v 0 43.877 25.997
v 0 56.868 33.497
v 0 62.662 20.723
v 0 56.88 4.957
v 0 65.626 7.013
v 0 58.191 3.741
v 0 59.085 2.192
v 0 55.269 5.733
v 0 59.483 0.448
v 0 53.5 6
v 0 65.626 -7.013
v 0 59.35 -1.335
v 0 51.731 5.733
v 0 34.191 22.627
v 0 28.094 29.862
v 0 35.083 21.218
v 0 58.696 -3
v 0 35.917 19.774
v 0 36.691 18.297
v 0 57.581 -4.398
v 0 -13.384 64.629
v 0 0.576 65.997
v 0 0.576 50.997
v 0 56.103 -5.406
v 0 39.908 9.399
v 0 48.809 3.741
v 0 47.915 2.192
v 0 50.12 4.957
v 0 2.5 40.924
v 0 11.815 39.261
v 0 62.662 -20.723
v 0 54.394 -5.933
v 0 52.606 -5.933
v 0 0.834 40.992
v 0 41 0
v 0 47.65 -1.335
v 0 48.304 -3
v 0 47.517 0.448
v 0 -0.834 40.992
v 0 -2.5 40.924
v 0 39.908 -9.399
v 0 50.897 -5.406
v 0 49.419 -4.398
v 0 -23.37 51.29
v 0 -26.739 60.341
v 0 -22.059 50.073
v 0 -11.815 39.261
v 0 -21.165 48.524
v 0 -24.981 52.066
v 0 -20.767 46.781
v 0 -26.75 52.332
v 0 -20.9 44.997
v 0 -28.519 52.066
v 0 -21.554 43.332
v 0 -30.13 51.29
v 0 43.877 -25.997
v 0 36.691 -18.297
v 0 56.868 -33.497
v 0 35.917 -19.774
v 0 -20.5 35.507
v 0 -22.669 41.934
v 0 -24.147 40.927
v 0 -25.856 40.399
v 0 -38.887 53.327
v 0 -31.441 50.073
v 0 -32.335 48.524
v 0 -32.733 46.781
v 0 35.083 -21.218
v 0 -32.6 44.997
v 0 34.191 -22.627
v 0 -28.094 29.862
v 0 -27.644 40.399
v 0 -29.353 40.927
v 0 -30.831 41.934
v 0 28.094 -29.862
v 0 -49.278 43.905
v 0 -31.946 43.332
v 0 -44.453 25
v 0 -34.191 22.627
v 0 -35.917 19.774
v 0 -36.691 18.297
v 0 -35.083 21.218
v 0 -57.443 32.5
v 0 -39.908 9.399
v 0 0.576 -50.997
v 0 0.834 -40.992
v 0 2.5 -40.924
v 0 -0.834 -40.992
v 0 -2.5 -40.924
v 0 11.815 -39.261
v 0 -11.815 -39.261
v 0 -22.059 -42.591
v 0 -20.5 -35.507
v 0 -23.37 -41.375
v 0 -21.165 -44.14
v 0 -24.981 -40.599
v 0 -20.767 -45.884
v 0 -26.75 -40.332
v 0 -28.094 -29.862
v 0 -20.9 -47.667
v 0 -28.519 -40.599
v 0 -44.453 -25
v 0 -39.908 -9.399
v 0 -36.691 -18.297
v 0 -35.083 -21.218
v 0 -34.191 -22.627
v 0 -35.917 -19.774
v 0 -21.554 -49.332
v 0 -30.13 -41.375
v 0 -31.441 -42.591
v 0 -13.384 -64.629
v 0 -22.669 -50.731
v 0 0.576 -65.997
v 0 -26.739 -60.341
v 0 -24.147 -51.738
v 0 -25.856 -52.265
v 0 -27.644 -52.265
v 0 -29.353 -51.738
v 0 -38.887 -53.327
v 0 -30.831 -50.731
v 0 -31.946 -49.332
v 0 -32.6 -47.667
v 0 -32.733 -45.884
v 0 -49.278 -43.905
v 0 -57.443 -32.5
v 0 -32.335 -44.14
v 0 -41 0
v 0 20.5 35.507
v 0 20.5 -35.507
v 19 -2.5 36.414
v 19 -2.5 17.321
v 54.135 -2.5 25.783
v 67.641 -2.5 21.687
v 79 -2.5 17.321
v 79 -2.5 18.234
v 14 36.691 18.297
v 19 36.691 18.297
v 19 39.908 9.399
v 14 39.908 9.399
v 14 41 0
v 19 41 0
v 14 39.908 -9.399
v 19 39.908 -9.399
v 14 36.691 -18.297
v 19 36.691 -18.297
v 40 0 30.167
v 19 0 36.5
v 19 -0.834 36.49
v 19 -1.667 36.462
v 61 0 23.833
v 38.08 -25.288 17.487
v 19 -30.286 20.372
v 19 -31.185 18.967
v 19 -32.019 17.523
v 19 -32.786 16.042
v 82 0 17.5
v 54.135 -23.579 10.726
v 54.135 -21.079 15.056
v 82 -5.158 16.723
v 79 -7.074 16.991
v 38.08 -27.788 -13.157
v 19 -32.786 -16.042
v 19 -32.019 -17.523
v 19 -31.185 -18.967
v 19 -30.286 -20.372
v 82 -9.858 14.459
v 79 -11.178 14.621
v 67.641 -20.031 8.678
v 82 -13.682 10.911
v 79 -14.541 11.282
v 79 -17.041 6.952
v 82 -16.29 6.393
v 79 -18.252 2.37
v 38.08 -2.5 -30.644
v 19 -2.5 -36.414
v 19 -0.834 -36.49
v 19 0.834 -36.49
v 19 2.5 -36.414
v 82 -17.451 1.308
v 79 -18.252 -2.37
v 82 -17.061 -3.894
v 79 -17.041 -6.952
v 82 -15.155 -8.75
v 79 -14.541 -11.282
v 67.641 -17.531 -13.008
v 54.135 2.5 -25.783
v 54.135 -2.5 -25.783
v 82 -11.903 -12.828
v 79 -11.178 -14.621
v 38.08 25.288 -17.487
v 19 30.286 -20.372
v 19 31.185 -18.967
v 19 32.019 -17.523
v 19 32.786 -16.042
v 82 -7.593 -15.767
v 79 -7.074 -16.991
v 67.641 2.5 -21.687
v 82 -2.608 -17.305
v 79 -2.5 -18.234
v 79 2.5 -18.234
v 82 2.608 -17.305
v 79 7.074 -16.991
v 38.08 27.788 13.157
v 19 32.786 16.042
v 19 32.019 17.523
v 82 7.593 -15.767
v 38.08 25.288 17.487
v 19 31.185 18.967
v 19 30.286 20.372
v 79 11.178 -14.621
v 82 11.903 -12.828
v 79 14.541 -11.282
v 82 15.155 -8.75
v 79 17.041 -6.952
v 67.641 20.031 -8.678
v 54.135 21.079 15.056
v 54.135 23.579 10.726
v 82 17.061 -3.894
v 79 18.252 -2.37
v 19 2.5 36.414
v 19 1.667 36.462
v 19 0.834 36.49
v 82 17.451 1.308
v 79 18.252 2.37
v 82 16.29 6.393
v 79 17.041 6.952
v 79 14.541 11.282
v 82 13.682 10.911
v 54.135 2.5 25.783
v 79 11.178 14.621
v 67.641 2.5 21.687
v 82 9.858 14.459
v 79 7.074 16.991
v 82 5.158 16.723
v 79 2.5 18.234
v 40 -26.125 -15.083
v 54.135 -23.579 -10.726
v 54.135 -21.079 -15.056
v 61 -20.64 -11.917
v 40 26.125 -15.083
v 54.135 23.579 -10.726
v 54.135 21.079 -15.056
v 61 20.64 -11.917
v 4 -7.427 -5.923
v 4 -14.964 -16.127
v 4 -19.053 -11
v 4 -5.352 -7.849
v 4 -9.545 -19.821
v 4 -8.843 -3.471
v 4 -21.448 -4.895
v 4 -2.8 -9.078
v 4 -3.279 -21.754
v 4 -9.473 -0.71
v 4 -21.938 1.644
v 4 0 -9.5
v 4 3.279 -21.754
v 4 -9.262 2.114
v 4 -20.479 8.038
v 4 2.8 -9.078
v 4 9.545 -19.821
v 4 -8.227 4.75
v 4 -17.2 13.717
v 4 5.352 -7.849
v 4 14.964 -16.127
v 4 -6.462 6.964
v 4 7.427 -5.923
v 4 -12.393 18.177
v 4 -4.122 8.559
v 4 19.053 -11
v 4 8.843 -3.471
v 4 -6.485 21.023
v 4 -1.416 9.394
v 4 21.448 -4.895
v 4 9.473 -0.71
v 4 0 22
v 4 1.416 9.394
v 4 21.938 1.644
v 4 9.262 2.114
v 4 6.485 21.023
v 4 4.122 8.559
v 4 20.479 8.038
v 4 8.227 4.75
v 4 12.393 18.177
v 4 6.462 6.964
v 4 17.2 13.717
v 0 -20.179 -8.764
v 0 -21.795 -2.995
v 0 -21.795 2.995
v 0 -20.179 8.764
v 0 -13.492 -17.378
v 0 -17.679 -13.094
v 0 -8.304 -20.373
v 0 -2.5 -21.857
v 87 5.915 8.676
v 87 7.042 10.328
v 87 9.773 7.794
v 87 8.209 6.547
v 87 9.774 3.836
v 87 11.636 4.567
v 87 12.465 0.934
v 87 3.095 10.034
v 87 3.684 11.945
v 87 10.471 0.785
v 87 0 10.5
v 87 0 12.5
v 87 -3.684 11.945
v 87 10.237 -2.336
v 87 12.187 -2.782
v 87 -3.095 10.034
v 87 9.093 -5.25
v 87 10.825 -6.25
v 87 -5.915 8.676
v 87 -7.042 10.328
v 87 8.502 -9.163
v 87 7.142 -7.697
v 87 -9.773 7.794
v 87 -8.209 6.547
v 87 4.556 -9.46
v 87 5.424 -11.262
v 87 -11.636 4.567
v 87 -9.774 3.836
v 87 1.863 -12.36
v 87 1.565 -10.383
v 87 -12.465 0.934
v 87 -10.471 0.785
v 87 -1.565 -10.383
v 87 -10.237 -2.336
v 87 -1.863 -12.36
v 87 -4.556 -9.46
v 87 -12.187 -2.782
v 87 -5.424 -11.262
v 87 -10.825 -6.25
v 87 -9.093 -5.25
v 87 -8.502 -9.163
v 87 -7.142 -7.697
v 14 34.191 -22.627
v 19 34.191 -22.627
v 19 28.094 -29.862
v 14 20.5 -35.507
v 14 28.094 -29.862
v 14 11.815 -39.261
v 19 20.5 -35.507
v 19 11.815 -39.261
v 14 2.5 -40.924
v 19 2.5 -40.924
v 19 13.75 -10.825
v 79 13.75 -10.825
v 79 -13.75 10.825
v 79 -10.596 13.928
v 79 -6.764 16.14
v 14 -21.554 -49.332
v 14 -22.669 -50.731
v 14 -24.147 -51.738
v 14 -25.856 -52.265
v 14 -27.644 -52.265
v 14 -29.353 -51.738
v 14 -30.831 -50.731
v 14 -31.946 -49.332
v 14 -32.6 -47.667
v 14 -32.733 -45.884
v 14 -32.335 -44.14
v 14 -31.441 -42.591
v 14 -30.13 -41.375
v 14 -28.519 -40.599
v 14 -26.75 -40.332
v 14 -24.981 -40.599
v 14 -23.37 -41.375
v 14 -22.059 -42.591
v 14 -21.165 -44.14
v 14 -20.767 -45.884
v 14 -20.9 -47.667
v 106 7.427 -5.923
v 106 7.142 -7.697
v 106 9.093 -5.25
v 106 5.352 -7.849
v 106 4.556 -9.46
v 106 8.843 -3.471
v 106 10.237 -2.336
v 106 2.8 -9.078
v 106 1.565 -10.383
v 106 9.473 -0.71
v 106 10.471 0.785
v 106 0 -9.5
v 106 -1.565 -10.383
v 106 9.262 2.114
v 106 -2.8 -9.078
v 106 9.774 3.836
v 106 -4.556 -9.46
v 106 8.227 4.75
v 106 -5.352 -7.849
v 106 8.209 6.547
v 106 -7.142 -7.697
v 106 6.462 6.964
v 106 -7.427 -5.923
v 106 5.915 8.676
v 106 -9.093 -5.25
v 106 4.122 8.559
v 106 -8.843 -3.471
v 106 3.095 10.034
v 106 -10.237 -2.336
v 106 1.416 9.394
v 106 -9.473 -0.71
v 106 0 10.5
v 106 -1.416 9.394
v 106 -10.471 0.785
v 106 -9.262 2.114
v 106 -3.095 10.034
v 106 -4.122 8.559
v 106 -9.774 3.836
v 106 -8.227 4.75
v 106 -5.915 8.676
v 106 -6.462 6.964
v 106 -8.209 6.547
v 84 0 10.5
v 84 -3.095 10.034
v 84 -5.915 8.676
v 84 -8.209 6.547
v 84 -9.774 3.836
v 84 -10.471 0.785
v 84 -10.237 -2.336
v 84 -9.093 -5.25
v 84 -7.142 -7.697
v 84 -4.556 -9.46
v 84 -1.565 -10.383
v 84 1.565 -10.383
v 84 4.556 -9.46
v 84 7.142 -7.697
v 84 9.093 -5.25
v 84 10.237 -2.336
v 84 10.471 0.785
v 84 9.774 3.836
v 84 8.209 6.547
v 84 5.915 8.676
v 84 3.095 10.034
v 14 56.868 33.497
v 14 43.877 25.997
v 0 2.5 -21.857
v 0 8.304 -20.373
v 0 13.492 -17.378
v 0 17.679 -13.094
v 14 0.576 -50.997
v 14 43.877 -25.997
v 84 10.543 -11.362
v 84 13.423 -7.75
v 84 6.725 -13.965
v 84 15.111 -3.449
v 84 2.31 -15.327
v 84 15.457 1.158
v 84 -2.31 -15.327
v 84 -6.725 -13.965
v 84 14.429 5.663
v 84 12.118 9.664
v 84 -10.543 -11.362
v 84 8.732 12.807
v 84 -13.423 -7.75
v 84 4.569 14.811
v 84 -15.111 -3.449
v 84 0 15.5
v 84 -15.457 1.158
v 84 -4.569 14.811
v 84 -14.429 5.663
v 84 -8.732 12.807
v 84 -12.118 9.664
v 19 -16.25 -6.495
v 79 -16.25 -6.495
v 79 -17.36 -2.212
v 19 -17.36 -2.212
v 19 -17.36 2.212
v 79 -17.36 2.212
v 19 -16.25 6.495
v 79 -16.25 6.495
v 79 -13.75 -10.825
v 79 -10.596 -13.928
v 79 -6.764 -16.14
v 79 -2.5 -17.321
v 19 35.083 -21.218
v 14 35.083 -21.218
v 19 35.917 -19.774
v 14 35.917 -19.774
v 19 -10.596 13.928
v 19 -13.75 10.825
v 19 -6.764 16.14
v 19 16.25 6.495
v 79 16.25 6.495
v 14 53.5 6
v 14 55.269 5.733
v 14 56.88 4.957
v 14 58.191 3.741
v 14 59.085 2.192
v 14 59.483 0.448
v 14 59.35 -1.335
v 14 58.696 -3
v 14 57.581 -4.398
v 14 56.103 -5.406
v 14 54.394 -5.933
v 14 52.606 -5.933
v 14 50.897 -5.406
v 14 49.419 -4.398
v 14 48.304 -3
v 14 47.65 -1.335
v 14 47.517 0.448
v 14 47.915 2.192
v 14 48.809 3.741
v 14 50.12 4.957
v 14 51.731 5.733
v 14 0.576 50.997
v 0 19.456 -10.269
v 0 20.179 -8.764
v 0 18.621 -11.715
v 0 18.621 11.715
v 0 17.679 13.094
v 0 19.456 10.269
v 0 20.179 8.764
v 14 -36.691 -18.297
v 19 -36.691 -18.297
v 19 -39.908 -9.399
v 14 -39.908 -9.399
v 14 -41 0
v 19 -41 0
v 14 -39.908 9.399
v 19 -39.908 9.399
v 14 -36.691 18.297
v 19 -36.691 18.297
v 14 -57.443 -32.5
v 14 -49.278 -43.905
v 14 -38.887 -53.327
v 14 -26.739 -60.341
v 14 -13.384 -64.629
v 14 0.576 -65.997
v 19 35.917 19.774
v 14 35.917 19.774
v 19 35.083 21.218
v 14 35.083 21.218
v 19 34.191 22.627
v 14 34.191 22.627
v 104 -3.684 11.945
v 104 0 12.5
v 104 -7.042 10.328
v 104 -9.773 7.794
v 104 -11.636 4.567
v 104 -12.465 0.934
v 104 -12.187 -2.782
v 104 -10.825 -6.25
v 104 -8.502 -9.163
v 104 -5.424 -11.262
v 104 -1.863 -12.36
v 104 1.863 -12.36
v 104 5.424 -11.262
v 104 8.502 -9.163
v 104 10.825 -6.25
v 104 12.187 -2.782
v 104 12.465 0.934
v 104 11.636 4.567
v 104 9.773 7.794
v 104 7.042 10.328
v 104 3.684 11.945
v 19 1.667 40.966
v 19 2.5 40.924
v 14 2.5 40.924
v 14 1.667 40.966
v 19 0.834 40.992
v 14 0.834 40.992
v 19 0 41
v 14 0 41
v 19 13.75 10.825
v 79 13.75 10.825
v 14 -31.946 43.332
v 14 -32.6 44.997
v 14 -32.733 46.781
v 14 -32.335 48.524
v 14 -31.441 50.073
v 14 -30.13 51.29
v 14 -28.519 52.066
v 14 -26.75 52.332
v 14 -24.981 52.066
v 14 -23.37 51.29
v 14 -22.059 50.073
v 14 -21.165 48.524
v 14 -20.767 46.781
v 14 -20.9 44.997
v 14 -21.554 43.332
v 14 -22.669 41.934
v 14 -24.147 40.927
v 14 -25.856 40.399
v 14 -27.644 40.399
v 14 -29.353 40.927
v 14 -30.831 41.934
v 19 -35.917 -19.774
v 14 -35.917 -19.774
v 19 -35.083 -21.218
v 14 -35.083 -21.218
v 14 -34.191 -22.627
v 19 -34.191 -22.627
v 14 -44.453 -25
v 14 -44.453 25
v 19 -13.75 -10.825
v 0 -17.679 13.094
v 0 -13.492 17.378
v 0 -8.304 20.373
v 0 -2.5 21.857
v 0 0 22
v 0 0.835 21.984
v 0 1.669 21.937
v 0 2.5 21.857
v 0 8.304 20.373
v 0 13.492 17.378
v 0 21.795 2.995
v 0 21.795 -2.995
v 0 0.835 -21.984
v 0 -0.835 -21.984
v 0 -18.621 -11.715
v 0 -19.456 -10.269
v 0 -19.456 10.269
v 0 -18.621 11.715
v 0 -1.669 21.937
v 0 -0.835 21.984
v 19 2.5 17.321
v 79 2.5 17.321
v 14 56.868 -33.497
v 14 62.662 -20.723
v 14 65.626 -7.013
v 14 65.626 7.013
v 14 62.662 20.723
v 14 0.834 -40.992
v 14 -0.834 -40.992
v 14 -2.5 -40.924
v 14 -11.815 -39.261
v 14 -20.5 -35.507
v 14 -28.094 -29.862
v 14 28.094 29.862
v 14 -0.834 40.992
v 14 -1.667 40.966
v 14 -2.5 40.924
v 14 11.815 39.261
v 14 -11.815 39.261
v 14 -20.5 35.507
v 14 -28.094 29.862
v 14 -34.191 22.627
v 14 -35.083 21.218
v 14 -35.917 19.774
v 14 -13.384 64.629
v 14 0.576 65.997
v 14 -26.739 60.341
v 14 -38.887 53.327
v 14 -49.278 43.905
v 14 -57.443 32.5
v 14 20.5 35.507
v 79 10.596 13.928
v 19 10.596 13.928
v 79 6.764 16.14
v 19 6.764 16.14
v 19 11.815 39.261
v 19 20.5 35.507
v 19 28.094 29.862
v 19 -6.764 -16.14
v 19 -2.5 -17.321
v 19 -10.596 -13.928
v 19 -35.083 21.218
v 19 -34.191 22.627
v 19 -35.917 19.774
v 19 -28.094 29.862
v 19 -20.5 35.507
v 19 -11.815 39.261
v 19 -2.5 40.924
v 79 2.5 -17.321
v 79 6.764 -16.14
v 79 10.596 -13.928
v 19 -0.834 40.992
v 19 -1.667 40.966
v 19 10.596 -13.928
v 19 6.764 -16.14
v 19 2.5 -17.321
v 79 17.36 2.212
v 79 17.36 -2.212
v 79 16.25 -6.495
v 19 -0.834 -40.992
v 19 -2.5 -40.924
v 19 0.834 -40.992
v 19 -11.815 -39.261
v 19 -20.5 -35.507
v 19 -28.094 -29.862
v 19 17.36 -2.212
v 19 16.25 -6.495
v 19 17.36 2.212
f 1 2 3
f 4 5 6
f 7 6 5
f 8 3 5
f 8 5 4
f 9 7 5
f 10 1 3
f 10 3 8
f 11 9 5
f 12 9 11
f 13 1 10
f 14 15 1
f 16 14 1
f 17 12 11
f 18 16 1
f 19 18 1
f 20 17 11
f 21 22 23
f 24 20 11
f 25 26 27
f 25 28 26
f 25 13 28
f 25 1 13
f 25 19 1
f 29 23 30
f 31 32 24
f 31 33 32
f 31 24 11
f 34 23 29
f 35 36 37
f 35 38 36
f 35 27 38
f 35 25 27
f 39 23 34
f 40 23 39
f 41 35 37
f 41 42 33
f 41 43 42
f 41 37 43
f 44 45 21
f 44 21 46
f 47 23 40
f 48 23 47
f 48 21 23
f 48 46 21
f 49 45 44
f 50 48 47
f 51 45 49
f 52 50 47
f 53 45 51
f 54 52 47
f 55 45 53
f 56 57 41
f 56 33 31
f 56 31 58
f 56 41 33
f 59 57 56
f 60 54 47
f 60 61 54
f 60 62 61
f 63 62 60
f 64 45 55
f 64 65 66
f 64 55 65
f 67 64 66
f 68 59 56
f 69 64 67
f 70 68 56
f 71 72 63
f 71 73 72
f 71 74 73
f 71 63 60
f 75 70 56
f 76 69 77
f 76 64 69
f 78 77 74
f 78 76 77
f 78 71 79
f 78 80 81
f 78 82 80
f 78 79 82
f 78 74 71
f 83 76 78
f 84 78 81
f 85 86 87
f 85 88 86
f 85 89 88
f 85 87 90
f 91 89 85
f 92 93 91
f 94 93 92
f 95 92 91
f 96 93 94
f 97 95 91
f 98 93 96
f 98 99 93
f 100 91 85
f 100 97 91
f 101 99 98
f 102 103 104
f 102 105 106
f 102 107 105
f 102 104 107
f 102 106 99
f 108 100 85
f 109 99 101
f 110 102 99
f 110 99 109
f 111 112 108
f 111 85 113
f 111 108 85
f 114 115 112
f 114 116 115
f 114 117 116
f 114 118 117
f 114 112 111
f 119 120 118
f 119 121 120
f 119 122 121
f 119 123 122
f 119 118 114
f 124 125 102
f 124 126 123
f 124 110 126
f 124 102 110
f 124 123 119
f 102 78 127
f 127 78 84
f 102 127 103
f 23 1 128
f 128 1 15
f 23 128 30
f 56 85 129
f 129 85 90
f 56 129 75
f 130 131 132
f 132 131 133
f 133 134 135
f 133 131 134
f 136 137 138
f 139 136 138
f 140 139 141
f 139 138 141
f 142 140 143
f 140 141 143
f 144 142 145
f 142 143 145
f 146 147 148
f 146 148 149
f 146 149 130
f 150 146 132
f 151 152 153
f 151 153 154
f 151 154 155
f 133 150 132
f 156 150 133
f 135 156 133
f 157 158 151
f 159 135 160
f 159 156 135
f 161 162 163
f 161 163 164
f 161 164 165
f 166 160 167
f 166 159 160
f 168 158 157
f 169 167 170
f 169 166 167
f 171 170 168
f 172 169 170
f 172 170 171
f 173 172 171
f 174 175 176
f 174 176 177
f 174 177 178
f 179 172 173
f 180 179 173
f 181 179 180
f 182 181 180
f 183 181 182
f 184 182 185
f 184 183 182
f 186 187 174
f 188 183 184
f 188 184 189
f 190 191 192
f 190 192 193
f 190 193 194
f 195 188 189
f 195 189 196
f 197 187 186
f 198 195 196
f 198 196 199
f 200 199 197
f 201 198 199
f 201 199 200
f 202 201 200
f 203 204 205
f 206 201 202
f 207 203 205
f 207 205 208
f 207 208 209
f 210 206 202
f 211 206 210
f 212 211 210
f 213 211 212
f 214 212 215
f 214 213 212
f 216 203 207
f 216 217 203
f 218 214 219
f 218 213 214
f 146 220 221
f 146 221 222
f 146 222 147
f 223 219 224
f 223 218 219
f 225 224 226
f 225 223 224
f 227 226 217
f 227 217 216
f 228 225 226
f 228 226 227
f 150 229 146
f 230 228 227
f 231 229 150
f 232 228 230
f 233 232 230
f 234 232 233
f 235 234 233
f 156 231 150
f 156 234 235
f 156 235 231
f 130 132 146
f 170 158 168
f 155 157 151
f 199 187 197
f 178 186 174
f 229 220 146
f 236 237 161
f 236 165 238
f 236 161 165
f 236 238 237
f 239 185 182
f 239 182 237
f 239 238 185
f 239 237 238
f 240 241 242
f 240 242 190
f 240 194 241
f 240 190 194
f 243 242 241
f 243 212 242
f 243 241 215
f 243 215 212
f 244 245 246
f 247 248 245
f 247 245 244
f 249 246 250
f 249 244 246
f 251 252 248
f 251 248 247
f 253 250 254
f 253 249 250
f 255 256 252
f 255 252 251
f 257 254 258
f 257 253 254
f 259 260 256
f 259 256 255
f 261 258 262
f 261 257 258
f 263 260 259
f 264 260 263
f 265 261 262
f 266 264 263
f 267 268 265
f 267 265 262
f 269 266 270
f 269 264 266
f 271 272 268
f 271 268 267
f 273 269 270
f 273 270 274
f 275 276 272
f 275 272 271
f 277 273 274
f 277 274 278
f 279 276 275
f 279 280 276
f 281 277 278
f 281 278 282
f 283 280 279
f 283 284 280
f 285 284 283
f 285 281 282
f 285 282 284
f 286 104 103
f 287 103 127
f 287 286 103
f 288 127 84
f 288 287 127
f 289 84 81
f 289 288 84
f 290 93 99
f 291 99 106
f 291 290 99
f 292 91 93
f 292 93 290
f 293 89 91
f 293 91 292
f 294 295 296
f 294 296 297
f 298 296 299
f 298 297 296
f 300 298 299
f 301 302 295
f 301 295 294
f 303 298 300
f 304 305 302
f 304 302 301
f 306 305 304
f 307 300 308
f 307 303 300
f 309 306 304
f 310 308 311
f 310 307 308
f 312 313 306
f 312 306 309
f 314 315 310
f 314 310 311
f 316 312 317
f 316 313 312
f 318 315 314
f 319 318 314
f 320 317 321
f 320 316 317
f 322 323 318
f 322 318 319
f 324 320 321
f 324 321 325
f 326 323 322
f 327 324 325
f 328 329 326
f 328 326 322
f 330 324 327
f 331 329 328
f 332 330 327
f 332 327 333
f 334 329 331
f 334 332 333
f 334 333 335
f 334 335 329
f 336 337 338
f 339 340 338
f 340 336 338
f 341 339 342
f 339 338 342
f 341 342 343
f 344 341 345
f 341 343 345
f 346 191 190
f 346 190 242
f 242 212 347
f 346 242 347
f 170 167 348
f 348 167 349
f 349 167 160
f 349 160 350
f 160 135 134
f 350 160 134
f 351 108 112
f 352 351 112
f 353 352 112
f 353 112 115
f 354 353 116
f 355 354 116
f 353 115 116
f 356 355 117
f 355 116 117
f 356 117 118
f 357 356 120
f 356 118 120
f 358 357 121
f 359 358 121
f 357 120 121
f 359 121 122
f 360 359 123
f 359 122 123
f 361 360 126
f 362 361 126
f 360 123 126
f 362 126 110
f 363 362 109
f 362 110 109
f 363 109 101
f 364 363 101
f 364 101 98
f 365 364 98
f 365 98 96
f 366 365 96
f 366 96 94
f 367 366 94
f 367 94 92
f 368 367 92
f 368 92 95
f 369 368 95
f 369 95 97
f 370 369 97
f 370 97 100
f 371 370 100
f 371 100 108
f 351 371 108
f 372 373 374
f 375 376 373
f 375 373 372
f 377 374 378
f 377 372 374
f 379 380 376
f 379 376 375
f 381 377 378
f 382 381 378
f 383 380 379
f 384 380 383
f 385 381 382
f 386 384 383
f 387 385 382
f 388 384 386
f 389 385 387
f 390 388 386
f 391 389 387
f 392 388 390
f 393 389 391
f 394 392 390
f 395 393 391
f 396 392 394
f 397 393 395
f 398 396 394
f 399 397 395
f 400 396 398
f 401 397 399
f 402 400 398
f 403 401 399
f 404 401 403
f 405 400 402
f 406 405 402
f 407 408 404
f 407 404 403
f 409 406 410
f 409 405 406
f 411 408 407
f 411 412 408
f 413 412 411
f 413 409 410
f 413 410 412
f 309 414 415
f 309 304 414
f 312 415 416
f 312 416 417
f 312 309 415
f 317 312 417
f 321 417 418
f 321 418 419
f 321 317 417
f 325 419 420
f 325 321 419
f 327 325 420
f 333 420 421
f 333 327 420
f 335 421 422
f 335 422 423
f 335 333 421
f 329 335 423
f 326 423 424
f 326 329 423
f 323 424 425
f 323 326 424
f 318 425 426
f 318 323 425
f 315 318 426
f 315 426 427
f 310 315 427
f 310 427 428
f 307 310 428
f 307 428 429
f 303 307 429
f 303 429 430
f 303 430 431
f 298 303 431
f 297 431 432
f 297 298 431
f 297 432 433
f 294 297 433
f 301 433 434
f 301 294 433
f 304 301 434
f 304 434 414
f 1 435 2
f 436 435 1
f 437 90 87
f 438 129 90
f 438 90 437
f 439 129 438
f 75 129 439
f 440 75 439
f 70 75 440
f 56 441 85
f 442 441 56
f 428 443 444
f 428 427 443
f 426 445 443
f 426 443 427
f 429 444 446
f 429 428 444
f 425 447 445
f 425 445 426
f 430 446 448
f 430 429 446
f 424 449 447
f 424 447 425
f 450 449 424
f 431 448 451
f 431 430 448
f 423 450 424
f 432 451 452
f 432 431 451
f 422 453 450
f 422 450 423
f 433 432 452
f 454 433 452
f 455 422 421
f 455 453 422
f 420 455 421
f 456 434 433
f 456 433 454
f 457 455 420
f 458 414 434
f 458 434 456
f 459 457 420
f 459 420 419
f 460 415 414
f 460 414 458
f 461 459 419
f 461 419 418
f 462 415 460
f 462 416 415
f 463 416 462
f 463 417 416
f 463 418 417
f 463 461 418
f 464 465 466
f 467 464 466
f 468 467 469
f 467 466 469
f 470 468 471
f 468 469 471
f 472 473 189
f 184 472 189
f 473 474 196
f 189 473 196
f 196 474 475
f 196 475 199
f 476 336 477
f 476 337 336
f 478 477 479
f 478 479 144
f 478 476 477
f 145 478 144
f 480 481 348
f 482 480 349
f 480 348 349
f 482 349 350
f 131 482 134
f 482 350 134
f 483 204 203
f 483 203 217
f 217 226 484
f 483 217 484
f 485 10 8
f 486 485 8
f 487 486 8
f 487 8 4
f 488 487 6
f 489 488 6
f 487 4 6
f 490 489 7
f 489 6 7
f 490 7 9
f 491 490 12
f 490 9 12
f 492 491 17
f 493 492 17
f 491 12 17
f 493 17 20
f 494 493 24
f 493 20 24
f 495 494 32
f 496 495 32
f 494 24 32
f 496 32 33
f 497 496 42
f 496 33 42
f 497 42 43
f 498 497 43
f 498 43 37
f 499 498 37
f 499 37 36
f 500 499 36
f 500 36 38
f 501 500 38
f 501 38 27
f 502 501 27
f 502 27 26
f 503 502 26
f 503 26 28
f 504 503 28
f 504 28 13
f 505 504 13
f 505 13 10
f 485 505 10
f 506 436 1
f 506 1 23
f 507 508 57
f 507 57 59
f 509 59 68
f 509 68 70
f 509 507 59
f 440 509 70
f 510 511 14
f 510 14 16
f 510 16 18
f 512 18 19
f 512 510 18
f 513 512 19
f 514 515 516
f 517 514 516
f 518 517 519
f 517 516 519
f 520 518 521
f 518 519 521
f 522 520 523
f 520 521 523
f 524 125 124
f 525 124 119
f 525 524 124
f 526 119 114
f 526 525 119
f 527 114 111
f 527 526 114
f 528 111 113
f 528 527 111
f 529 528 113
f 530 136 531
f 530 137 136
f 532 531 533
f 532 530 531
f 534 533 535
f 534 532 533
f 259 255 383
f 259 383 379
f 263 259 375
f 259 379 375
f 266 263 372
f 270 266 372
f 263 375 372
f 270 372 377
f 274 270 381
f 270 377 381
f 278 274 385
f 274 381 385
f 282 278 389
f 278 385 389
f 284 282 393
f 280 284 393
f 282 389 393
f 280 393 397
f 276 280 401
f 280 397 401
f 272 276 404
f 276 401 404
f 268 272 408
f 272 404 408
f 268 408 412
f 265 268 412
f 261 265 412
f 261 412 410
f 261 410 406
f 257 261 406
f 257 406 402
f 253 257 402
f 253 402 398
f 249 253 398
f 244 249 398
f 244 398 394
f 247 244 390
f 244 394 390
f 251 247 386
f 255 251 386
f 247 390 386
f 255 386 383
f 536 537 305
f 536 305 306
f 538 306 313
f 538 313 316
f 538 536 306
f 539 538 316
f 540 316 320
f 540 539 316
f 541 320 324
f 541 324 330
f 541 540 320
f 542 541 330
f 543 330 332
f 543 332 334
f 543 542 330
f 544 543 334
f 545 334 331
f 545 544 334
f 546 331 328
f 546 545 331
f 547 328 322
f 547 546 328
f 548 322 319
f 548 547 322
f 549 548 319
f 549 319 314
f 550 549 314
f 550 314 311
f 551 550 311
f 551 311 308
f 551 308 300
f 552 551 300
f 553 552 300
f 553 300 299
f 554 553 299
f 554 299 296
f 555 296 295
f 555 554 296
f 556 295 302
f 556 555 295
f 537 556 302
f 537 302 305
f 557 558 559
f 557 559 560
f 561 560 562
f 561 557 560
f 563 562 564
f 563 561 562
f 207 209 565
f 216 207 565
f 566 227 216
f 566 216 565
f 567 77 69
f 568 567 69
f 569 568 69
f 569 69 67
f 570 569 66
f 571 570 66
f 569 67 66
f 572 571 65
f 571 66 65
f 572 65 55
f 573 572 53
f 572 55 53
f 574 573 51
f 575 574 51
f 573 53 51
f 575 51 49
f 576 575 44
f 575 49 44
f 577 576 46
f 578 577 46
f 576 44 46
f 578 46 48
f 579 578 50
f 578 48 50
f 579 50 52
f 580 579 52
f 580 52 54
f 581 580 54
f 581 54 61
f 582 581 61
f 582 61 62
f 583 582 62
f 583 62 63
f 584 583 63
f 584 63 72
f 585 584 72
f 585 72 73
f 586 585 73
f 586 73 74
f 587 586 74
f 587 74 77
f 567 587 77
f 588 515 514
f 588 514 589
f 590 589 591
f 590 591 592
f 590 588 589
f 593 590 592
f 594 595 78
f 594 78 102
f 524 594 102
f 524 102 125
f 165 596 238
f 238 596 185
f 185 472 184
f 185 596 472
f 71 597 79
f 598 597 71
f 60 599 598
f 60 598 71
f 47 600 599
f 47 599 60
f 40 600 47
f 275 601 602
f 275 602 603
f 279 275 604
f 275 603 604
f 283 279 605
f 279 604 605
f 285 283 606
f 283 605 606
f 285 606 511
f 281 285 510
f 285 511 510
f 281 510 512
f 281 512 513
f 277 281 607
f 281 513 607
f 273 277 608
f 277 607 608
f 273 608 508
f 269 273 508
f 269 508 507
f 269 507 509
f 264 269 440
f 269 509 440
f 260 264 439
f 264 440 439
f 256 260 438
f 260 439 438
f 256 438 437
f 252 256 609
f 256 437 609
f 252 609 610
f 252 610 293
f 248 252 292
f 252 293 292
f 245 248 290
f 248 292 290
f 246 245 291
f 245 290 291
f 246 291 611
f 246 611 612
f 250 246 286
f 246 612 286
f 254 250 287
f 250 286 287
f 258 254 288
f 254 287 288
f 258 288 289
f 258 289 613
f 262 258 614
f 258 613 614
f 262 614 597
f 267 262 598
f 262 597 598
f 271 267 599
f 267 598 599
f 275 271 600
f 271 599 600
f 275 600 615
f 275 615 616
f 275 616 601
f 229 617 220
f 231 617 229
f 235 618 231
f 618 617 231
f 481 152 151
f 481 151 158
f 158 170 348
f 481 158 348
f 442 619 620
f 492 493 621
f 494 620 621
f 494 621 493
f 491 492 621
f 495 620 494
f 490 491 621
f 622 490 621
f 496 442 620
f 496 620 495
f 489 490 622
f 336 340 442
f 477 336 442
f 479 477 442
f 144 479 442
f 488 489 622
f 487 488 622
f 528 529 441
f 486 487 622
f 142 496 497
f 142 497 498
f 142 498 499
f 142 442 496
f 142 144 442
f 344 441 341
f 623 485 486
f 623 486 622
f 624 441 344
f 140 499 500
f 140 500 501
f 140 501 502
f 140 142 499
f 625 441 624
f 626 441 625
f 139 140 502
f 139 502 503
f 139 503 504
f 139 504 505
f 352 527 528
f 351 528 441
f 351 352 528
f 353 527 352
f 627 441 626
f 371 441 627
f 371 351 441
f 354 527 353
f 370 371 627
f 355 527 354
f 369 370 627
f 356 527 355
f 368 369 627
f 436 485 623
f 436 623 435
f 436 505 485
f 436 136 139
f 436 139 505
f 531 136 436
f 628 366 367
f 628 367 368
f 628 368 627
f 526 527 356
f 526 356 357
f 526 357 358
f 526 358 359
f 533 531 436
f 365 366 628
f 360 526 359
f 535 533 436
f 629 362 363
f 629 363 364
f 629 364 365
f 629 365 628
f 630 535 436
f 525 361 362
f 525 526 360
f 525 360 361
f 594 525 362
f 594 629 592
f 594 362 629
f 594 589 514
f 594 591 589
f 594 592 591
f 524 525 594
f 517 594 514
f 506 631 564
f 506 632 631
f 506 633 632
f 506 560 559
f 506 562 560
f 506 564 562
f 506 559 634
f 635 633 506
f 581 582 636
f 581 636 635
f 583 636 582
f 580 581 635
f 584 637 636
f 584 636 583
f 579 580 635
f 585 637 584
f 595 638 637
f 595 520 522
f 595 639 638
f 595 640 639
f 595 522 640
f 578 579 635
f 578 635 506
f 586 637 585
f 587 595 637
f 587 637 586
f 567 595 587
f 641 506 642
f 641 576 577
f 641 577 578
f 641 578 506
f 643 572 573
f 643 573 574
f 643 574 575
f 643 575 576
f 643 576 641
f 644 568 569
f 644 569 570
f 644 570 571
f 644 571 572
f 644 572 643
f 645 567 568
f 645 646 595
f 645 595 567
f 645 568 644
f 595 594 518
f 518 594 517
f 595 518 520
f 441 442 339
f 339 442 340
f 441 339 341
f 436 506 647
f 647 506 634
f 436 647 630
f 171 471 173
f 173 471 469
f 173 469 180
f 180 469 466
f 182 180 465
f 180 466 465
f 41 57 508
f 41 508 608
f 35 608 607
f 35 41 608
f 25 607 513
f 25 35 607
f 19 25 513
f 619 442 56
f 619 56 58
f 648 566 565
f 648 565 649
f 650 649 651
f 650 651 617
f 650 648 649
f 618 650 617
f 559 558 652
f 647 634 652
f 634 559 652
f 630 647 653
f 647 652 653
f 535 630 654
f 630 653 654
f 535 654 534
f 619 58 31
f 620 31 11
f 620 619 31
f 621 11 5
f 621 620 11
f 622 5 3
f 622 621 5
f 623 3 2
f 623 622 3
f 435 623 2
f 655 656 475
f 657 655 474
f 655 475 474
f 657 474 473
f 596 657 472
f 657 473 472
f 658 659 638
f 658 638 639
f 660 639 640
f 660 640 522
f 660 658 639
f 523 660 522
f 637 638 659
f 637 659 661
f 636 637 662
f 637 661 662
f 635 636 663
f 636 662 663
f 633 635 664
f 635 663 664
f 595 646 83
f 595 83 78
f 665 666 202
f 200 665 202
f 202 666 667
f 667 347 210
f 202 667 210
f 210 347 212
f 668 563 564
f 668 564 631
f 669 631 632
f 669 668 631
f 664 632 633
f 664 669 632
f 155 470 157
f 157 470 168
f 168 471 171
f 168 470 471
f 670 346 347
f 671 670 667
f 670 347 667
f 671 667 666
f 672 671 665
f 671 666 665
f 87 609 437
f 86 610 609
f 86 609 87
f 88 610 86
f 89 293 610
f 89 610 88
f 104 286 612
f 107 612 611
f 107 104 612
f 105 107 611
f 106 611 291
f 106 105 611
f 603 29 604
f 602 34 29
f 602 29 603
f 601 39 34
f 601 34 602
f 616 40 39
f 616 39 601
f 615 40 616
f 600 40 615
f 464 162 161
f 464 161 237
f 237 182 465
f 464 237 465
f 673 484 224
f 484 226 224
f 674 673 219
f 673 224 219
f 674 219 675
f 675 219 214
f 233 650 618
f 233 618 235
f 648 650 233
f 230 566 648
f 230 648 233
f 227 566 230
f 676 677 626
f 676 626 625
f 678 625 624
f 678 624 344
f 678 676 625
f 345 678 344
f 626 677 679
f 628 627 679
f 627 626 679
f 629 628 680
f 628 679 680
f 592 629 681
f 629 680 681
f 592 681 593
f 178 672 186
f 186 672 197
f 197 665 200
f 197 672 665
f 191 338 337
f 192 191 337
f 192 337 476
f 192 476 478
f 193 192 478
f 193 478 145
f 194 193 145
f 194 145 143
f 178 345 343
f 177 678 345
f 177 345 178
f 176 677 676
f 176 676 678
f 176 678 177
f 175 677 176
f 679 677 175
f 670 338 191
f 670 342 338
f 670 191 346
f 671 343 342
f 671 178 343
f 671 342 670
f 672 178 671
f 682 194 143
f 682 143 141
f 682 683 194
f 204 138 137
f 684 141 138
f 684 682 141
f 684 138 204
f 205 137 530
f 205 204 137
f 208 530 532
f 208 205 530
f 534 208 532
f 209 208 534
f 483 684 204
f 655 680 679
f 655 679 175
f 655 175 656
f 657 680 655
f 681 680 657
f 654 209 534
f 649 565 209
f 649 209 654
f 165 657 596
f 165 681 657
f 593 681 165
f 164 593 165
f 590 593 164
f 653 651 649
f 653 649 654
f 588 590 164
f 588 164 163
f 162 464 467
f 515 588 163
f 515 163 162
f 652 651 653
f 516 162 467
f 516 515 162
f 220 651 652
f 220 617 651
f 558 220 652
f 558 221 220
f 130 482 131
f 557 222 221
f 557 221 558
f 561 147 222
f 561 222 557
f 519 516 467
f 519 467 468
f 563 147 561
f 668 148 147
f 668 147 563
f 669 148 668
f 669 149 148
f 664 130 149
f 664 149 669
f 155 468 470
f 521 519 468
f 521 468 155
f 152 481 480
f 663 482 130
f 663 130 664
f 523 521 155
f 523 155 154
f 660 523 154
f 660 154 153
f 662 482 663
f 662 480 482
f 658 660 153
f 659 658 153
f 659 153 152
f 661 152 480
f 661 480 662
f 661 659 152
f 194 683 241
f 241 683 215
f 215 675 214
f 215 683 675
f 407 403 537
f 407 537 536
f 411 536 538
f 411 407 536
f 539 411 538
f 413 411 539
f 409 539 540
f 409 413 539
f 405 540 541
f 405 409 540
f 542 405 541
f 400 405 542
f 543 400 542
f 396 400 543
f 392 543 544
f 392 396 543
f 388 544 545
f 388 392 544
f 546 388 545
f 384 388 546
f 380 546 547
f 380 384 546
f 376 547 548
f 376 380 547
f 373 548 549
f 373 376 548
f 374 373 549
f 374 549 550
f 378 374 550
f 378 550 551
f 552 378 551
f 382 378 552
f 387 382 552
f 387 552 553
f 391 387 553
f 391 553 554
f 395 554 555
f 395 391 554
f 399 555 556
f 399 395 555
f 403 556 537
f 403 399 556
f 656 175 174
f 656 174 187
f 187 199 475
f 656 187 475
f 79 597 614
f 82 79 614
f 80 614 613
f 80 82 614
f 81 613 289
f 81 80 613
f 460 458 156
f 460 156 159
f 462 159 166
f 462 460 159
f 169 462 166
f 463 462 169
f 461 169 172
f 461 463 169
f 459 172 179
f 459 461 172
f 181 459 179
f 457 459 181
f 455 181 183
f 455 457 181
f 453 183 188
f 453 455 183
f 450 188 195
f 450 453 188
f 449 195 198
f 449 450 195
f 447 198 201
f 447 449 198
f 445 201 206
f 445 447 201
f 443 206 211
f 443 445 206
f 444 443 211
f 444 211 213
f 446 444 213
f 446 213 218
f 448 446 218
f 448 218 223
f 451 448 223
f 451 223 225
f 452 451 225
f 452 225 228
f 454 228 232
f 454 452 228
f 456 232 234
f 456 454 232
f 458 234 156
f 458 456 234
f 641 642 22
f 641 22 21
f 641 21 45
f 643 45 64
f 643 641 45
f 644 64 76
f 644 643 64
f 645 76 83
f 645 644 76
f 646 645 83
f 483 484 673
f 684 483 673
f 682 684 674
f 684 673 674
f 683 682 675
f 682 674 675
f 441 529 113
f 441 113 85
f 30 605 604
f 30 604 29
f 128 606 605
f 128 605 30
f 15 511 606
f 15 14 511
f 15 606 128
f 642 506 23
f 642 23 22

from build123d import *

# Parameters (mm, degrees)
SKETCH2_W           = 3
SKETCH2_H           = 2
CHAMFER1_SIZE       = 2
CUT_EXTRUDE1_DEPTH  = 132.057239403
CIRPATTERN1_COUNT   = 3
HOLE1_D             = 12
CIRPATTERN2_COUNT   = 3
CUT_EXTRUDE2_START  = -79
CUT_EXTRUDE2_DEPTH  = 79
BOSS_EXTRUDE2_START = -19
SKETCH9_R           = 41
BOSS_EXTRUDE2_DEPTH = 19
HOLE3_D             = 19
HOLE3_CBORE_D       = 44
HOLE3_CBORE_DEPTH   = 4


with BuildPart() as part:
    # Sketch1 → Revolve3 (revolve)
    with BuildSketch(Plane.XY, mode=Mode.PRIVATE) as revolve3_sk:
        Polygon((0, 0), (0, 66), (14, 66), (14, 41), (19, 41), (19, 17.5), (84, 17.5), (84, 12.5), (106, 12.5), (106, 0), align=None)
    revolve(revolve3_sk.sketch.rotate(Axis((0, 0, 0), (1, 0, 0)), 90), axis=Axis((0, 0, 0), (1, 0, 0)))

    # Sketch2 → Cut-Revolve1 (revolve, cut)
    with BuildSketch(Plane.XY, mode=Mode.PRIVATE) as cut_revolve1_sk:
        with Locations((85.5, 11.5)):
            Rectangle(SKETCH2_W, SKETCH2_H)
    revolve(cut_revolve1_sk.sketch.rotate(Axis((0, 0, 0), (1, 0, 0)), 90), axis=Axis((0, 0, 0), (1, 0, 0)), mode=Mode.SUBTRACT)

    # Sketch3 → Revolve5 (revolve)
    with BuildSketch(Plane(origin=(0, 0, 0), x_dir=(1, 0, 0), z_dir=(0, 1, 0)), mode=Mode.PRIVATE) as revolve5_sk:
        Polygon((19, 36.5), (82, 17.5), (19, 17.5), align=None)
    revolve(revolve5_sk.sketch.rotate(Axis((0, 0, 0), (1, 0, 0)), 180), axis=Axis((0, 0, 0), (1, 0, 0)))

    # Chamfer1
    chamfer1_edges = [part.edges().sort_by_distance(p)[0] for p in [
        (106, 0, -12.5),
        (84, 0, -17.5),
    ]]
    chamfer(chamfer1_edges, length=CHAMFER1_SIZE - 0.0001)  # a hair under: the kernel refuses the full size

    # Sketch4 → Cut-Extrude1 (cut, through all)
    with BuildSketch(Plane(origin=(14, 0, 0), x_dir=(0, 0, -1), z_dir=(1, 0, 0))):
        with BuildLine():
            Line((-32.5, -57.443450453), (-25, -44.453069397))
            Line((-25, -44.453069397), (25, -44.453069397))
            Line((25, -44.453069397), (32.5, -57.443450453))
            ThreePointArc((32.5, -57.443450453), (0, -66), (-32.5, -57.443450453))
        make_face()
    cut_extrude1 = extrude(amount=-CUT_EXTRUDE1_DEPTH, mode=Mode.SUBTRACT)

    # CirPattern1: Cut-Extrude1 ×3 about axis
    cirpattern1_axis = Axis((0, 0, 0), (1, 0, 0))
    for i in range(1, CIRPATTERN1_COUNT):
        add(cut_extrude1.rotate(cirpattern1_axis, i * 360 / CIRPATTERN1_COUNT), mode=Mode.SUBTRACT)

    # Hole1 (through all)
    with Locations(Plane(origin=(14, 0, 0), x_dir=(0, 0, -1), z_dir=(1, 0, 0))):
        with Locations((0, 53.5)):
            hole1 = Hole(HOLE1_D / 2)

    # CirPattern2: Hole1 ×3 about axis
    cirpattern2_axis = Axis((0, 0, 0), (1, 0, 0))
    for i in range(1, CIRPATTERN2_COUNT):
        add(hole1.rotate(cirpattern2_axis, i * 360 / CIRPATTERN2_COUNT), mode=Mode.SUBTRACT)

    # Sketch7 → Cut-Extrude2 (cut)
    with BuildSketch(Plane.ZY.offset(CUT_EXTRUDE2_START)):
        with BuildLine():
            Line((17.320508076, 2.5), (40.923709509, 2.5))
            ThreePointArc((40.923709509, 2.5), (35.507041555, 20.5), (22.626918264, 34.190972052))
            Line((22.626918264, 34.190972052), (10.825317547, 13.75))
            ThreePointArc((10.825317547, 13.75), (15.155444566, 8.75), (17.320508076, 2.5))
        make_face()
        with BuildLine():
            Line((17.320508076, -2.5), (40.923709509, -2.5))
            ThreePointArc((40.923709509, -2.5), (35.507041555, -20.5), (22.626918264, -34.190972052))
            Line((22.626918264, -34.190972052), (10.825317547, -13.75))
            ThreePointArc((10.825317547, -13.75), (15.155444566, -8.75), (17.320508076, -2.5))
        make_face()
        with BuildLine():
            Line((6.495190528, -16.25), (18.296791245, -36.690972052))
            ThreePointArc((18.296791245, -36.690972052), (0, -41), (-18.296791245, -36.690972052))
            Line((-18.296791245, -36.690972052), (-6.495190528, -16.25))
            ThreePointArc((-6.495190528, -16.25), (0, -17.5), (6.495190528, -16.25))
        make_face()
        with BuildLine():
            Line((-10.825317547, -13.75), (-22.626918264, -34.190972052))
            ThreePointArc((-22.626918264, -34.190972052), (-35.507041555, -20.5), (-40.923709509, -2.5))
            Line((-40.923709509, -2.5), (-17.320508076, -2.5))
            ThreePointArc((-17.320508076, -2.5), (-15.155444566, -8.75), (-10.825317547, -13.75))
        make_face()
        with BuildLine():
            Line((-17.320508076, 2.5), (-40.923709509, 2.5))
            ThreePointArc((-40.923709509, 2.5), (-35.507041555, 20.5), (-22.626918264, 34.190972052))
            Line((-22.626918264, 34.190972052), (-10.825317547, 13.75))
            ThreePointArc((-10.825317547, 13.75), (-15.155444566, 8.75), (-17.320508076, 2.5))
        make_face()
        with BuildLine():
            Line((-6.495190528, 16.25), (-18.296791245, 36.690972052))
            ThreePointArc((-18.296791245, 36.690972052), (0, 41), (18.296791245, 36.690972052))
            Line((18.296791245, 36.690972052), (6.495190528, 16.25))
            ThreePointArc((6.495190528, 16.25), (0, 17.5), (-6.495190528, 16.25))
        make_face()
    extrude(amount=CUT_EXTRUDE2_DEPTH, mode=Mode.SUBTRACT)

    # Sketch9 → Boss-Extrude2 (add)
    with BuildSketch(Plane.ZY.offset(BOSS_EXTRUDE2_START)):
        Circle(SKETCH9_R)
    extrude(amount=BOSS_EXTRUDE2_DEPTH)

    # Hole3 (through all)
    with Locations(Plane.ZY):
        with Locations((0, 0)):
            CounterBoreHole(HOLE3_D / 2, HOLE3_CBORE_D / 2, HOLE3_CBORE_DEPTH)


solid = part.part
